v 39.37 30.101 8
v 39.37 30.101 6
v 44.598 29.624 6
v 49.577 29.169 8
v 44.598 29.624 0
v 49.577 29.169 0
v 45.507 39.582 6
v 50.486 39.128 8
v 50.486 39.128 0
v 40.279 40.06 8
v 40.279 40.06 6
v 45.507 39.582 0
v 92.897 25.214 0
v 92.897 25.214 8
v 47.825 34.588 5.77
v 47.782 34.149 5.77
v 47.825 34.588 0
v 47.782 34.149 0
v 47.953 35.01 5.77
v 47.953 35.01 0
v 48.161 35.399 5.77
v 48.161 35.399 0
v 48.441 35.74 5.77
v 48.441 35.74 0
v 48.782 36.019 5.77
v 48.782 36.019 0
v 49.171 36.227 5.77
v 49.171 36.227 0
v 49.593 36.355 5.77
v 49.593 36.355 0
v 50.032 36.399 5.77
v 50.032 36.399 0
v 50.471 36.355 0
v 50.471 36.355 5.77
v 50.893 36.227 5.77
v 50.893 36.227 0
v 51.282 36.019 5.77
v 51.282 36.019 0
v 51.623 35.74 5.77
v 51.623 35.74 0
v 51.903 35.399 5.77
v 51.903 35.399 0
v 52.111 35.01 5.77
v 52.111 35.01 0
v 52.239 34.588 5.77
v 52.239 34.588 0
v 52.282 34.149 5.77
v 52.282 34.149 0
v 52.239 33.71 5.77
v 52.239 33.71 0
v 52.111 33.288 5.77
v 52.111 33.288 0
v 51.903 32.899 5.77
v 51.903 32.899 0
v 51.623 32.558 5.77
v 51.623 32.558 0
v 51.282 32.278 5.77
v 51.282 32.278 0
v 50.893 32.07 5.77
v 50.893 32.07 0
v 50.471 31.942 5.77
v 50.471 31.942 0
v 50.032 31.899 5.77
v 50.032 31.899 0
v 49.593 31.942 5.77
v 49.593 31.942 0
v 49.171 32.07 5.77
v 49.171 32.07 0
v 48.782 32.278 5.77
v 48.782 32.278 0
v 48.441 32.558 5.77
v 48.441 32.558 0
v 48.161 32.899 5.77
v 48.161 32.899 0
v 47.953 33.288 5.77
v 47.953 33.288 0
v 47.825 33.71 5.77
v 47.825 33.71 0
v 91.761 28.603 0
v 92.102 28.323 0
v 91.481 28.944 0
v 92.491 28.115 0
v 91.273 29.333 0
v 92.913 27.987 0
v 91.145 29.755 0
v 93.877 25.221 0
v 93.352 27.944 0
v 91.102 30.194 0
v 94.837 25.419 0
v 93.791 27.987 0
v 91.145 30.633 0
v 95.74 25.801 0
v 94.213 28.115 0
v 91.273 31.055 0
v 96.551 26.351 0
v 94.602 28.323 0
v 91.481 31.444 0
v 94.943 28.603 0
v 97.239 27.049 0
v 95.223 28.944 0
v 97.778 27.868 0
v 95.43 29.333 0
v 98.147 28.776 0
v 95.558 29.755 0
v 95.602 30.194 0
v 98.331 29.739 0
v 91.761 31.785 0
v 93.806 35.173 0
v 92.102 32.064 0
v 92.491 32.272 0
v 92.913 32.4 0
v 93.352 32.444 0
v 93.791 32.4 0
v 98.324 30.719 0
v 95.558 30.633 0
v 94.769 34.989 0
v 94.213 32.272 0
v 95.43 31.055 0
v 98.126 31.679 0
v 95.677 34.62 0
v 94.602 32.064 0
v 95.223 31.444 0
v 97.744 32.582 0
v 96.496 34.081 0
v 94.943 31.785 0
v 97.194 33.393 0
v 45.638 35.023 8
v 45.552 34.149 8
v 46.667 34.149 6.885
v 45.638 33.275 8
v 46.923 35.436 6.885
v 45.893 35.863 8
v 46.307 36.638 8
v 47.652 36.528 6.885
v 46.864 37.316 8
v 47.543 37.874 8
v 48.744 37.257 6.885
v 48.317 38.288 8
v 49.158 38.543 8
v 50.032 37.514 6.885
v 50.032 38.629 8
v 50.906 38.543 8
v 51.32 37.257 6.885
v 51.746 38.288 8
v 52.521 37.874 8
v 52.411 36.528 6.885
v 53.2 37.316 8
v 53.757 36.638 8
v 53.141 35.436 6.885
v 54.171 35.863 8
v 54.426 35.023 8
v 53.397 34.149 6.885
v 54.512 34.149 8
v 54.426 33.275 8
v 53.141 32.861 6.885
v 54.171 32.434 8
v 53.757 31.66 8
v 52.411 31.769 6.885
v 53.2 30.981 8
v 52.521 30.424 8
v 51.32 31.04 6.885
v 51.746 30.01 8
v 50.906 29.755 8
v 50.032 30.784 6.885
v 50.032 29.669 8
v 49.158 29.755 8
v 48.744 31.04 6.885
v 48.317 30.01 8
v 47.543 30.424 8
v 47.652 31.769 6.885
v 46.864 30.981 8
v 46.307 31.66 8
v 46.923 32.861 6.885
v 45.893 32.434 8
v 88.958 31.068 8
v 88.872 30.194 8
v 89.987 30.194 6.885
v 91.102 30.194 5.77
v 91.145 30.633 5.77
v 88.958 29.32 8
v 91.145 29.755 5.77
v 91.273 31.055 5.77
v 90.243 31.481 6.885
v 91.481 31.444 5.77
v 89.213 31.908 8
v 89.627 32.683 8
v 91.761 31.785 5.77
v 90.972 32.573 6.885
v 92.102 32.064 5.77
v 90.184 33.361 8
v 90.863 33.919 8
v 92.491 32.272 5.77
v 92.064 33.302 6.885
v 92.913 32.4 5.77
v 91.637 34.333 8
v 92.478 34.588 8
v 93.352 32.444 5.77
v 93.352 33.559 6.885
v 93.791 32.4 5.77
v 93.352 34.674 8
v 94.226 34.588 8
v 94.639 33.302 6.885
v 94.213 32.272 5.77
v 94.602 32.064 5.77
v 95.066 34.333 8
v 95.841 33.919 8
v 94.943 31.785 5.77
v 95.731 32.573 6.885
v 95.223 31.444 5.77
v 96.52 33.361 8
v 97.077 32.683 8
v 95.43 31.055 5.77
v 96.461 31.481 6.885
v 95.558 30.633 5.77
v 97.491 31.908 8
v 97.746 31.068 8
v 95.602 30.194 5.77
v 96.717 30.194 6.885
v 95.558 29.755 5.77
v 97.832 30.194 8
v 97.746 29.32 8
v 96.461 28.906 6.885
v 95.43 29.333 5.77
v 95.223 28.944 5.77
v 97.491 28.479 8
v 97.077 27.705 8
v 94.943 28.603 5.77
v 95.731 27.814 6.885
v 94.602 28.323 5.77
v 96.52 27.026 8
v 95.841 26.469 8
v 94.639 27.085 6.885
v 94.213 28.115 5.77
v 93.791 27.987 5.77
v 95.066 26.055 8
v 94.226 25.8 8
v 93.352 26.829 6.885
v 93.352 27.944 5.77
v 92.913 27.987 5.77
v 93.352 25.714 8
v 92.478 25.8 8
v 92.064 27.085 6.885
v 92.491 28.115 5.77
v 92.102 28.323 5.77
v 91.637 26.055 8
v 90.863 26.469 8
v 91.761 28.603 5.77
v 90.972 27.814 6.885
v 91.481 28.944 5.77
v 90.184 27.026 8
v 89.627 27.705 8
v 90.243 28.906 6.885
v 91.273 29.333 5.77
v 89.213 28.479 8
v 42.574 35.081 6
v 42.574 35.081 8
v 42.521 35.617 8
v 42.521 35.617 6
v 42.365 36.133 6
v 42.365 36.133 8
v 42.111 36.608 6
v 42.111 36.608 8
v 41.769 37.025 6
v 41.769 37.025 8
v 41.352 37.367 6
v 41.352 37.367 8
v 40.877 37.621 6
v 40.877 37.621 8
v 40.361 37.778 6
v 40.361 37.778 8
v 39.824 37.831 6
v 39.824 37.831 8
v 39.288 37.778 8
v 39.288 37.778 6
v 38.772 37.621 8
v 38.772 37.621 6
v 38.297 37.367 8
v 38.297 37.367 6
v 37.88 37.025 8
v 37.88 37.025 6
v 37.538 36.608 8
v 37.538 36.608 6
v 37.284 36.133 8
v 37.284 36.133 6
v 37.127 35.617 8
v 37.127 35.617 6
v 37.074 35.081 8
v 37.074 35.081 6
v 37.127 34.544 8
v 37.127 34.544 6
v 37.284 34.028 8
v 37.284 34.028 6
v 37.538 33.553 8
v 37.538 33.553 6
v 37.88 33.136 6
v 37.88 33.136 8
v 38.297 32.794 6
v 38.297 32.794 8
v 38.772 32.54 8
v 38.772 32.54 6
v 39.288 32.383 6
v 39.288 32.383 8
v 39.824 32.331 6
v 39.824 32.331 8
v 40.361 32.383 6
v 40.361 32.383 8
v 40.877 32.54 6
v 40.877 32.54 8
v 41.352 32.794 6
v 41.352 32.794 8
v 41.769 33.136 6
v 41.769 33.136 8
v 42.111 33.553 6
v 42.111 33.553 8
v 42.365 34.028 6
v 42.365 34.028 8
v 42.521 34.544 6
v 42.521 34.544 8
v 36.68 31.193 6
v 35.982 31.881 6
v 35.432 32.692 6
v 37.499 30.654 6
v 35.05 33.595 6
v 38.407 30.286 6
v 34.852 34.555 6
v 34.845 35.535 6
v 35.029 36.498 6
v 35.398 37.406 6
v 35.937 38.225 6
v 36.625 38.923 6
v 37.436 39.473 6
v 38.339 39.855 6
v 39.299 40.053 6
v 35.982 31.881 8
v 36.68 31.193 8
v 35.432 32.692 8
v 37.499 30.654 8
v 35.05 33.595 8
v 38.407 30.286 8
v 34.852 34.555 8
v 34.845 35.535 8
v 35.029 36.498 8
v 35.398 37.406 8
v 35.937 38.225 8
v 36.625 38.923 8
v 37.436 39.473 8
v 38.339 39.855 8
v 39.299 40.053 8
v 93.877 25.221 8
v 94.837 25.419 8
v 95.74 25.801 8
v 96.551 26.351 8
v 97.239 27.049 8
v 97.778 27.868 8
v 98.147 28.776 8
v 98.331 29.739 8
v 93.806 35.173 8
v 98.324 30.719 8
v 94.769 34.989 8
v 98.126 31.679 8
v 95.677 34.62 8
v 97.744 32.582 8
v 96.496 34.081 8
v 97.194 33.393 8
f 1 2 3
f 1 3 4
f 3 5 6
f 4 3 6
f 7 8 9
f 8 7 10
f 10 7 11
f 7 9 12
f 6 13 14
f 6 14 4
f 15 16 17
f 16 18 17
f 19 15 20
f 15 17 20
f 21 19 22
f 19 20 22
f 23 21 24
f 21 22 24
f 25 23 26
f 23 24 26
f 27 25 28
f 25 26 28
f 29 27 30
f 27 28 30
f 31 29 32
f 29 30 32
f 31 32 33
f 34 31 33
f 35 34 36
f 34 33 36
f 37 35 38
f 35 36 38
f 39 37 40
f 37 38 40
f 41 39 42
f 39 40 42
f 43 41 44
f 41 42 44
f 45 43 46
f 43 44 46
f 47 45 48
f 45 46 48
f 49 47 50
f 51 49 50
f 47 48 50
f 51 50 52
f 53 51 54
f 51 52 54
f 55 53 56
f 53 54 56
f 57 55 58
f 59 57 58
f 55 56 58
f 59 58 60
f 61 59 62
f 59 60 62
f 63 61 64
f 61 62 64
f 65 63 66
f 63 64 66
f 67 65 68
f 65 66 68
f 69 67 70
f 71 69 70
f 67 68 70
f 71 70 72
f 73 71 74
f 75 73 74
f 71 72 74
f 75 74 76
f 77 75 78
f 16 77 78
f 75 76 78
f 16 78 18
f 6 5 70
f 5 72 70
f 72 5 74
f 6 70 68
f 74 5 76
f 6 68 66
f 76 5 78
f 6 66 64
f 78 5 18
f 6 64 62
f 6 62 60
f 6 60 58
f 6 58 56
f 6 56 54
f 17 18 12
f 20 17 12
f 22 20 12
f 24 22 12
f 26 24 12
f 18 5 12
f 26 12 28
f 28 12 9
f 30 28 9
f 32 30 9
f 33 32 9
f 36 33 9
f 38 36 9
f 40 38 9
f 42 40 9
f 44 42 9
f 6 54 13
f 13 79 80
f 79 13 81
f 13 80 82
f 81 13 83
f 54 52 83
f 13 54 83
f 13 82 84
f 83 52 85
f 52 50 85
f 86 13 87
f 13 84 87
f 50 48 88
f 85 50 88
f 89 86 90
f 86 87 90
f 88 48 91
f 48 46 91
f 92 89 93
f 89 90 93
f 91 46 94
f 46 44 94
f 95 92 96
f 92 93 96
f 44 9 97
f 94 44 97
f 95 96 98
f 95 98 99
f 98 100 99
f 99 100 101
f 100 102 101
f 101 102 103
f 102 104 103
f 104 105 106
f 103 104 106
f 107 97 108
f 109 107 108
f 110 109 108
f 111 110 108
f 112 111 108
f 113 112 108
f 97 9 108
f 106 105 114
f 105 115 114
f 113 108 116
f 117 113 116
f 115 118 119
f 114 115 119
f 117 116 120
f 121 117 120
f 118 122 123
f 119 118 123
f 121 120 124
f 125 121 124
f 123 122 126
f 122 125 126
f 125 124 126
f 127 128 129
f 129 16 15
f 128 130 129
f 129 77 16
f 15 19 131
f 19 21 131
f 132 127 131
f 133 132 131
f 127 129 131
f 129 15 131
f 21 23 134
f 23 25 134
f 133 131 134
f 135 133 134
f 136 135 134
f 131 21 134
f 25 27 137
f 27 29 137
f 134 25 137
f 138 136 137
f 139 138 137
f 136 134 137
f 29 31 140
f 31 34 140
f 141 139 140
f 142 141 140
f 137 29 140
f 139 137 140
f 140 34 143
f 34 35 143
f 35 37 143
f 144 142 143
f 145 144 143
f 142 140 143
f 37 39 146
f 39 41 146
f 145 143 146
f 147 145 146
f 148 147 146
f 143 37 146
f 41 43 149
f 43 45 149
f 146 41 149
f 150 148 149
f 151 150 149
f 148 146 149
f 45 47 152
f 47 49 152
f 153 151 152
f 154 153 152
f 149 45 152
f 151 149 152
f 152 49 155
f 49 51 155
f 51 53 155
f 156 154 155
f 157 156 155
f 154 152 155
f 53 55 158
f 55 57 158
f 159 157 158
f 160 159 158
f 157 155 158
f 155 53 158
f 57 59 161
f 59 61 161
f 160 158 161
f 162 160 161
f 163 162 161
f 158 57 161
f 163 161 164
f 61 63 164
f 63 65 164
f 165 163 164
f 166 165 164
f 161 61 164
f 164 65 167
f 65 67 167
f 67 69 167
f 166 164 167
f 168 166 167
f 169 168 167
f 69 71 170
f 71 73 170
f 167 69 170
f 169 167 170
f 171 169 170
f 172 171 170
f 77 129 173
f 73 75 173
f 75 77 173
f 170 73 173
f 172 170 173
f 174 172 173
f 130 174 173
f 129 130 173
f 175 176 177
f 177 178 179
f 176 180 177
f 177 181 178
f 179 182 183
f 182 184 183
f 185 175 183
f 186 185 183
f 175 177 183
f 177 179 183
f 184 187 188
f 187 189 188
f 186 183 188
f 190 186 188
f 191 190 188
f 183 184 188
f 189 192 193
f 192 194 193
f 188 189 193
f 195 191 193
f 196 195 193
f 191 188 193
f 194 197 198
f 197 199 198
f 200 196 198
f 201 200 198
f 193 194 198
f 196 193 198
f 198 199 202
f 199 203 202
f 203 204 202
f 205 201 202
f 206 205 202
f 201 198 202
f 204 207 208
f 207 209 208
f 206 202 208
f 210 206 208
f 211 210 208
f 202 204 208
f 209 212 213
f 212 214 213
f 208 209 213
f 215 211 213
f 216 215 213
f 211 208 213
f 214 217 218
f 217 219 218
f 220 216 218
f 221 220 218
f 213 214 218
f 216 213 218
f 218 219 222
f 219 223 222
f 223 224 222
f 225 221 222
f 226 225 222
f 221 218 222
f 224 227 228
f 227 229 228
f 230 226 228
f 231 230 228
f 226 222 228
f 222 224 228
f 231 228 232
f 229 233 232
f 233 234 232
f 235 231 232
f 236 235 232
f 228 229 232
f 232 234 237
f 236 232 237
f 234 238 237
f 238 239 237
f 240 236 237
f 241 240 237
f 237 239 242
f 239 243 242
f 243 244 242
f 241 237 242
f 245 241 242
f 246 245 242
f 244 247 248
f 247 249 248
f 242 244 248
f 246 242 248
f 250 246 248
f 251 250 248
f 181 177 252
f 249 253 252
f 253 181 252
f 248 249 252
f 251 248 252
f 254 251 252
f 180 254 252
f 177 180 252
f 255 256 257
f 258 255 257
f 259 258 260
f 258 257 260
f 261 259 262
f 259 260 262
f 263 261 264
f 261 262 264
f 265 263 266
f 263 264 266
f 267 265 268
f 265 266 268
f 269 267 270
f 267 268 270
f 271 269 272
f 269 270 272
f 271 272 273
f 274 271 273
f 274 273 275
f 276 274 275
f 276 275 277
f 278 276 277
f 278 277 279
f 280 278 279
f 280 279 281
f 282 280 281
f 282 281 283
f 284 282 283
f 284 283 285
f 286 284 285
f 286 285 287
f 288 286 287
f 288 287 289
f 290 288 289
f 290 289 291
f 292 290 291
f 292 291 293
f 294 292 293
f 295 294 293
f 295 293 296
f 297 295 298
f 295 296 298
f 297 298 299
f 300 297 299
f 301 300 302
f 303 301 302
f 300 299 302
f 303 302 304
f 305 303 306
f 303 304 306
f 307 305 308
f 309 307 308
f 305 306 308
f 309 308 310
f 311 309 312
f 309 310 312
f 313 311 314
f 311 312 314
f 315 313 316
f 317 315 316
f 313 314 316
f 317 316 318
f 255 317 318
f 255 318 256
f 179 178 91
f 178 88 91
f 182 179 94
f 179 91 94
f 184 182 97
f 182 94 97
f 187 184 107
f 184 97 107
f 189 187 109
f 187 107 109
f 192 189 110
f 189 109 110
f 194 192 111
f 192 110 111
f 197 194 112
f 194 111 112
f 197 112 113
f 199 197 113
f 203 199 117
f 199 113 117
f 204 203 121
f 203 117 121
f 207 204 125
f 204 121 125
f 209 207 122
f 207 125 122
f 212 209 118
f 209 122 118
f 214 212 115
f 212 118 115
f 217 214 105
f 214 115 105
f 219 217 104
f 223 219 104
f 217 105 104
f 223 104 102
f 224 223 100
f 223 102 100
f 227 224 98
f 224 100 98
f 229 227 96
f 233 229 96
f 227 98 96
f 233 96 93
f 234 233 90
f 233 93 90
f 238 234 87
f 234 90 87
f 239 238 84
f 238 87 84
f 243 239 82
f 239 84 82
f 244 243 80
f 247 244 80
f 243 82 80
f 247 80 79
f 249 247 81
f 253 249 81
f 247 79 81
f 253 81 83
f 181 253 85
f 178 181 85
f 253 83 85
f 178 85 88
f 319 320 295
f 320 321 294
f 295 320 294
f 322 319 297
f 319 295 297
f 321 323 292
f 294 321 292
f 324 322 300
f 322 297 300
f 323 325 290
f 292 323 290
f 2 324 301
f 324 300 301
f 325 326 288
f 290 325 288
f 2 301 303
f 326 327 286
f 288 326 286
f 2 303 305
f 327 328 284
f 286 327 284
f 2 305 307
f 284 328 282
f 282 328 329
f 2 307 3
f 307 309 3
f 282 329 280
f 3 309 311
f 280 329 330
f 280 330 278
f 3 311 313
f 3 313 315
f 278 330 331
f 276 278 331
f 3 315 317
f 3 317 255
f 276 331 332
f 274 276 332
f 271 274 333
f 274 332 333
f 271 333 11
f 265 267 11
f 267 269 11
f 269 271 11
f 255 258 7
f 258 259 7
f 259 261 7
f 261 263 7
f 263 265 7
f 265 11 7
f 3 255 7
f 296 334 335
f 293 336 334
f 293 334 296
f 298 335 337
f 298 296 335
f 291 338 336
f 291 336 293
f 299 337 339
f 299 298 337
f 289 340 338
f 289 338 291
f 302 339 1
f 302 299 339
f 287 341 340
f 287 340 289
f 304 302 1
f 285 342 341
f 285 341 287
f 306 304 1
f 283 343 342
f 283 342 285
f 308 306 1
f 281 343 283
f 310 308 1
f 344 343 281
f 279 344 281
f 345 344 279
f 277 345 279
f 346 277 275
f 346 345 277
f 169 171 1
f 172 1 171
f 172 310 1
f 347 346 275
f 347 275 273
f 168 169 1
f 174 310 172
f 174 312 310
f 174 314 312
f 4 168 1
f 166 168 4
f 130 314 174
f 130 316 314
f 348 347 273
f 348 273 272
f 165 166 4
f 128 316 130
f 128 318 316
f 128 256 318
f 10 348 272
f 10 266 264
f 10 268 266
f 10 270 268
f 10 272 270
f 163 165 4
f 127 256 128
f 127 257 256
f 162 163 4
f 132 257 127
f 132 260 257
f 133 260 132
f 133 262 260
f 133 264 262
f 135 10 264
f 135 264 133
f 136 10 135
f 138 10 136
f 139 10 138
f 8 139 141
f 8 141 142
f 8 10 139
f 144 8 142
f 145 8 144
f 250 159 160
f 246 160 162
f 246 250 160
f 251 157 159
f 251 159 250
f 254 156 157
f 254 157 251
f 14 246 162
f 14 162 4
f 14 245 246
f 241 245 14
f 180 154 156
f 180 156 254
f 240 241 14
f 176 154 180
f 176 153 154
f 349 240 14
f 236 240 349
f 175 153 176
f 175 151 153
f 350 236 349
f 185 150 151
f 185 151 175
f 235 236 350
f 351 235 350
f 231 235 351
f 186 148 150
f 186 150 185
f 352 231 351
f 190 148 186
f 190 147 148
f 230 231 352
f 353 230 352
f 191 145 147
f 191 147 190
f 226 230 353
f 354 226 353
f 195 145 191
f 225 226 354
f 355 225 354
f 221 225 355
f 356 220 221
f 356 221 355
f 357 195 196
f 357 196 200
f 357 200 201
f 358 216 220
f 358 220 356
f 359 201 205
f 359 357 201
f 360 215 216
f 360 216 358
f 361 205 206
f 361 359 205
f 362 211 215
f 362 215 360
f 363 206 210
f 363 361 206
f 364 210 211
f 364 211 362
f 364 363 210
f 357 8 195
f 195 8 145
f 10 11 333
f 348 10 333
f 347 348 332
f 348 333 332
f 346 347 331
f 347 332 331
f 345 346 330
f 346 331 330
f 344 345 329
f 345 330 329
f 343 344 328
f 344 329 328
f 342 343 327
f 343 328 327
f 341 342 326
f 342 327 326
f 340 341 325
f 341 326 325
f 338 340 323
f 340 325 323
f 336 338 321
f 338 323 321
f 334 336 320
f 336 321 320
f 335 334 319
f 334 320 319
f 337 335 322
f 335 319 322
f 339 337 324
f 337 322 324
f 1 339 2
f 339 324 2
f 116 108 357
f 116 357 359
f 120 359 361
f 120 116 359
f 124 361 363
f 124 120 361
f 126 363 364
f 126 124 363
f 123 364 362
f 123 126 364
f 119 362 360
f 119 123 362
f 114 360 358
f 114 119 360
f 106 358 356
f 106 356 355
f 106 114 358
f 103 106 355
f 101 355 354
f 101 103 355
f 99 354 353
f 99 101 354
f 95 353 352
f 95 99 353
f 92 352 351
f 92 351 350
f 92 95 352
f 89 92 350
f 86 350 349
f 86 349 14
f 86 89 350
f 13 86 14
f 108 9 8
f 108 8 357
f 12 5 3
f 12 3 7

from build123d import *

# Parameters (mm, degrees)
BOSS_EXTRUDE1_DEPTH                                  = 8
CSK_FOR_M4_HEX_SOCKET_COUNTERSUNK_CAP_SC_D           = 4.5
CSK_FOR_M4_HEX_SOCKET_COUNTERSUNK_CAP_SC_CSINK_D     = 8.96
CSK_FOR_M4_HEX_SOCKET_COUNTERSUNK_CAP_SC_CSINK_ANGLE = 90
BOSS_EXTRUDE2_START                                  = -8
BOSS_EXTRUDE2_DEPTH                                  = 8
CUT_EXTRUDE1_DEPTH                                   = 6
M5_CLEARANCE_HOLE1_D                                 = 5.5


with BuildPart() as part:
    # Sketch1 → Boss-Extrude1 (new body)
    with BuildSketch(Plane.XY):
        with BuildLine():
            Line((92.897105977, 25.214321252), (49.577271028, 29.169305441))
            ThreePointArc((49.577271028, 29.169305441), (45.052575538, 34.603192698), (50.486462795, 39.127888188))
            Line((50.486462795, 39.127888188), (93.806297745, 35.172903999))
            ThreePointArc((93.806297745, 35.172903999), (98.330993235, 29.739016742), (92.897105977, 25.214321252))
        make_face()
    extrude(amount=BOSS_EXTRUDE1_DEPTH)

    # CSK for M4 Hex Socket Countersunk Cap Screw1 (through all)
    with Locations(Plane.XY.offset(8)):
        with Locations((93.351701861, 30.193612626), (50.031866911, 34.148596814)):
            CounterSinkHole(CSK_FOR_M4_HEX_SOCKET_COUNTERSUNK_CAP_SC_D / 2, CSK_FOR_M4_HEX_SOCKET_COUNTERSUNK_CAP_SC_CSINK_D / 2, counter_sink_angle=CSK_FOR_M4_HEX_SOCKET_COUNTERSUNK_CAP_SC_CSINK_ANGLE)

    # Sketch6 → Boss-Extrude2 (add)
    with BuildSketch(Plane.XY.offset(8).offset(BOSS_EXTRUDE2_START)):
        with BuildLine():
            Line((39.369723712, 30.101227002), (49.577271028, 29.169305441))
            ThreePointArc((49.577271028, 29.169305441), (45.052575538, 34.603192698), (50.486462795, 39.127888188))
            Line((50.486462795, 39.127888188), (40.278915479, 40.059809749))
            ThreePointArc((40.278915479, 40.059809749), (34.845028222, 35.535114259), (39.369723712, 30.101227002))
        make_face()
    extrude(amount=BOSS_EXTRUDE2_DEPTH)

    # Sketch8 → Cut-Extrude1 (cut)
    with BuildSketch(Plane(origin=(0, 0, 0), x_dir=(-1, 0, 0), z_dir=(0, 0, -1))):
        with BuildLine():
            Line((-39.346993918, 29.852262433), (-44.57524986, 29.374936756))
            Line((-44.57524986, 29.374936756), (-45.529901216, 39.83144864))
            Line((-45.529901216, 39.83144864), (-40.301645274, 40.308774318))
            ThreePointArc((-40.301645274, 40.308774318), (-34.596063653, 35.557844054), (-39.346993918, 29.852262433))
        make_face()
    extrude(amount=-CUT_EXTRUDE1_DEPTH, mode=Mode.SUBTRACT)

    # M5 Clearance Hole1 (through all)
    with Locations(Plane(origin=(0, 0, 6), x_dir=(-1, 0, 0), z_dir=(0, 0, -1))):
        with Locations((-39.824319596, 35.080518376)):
            Hole(M5_CLEARANCE_HOLE1_D / 2)


solid = part.part
